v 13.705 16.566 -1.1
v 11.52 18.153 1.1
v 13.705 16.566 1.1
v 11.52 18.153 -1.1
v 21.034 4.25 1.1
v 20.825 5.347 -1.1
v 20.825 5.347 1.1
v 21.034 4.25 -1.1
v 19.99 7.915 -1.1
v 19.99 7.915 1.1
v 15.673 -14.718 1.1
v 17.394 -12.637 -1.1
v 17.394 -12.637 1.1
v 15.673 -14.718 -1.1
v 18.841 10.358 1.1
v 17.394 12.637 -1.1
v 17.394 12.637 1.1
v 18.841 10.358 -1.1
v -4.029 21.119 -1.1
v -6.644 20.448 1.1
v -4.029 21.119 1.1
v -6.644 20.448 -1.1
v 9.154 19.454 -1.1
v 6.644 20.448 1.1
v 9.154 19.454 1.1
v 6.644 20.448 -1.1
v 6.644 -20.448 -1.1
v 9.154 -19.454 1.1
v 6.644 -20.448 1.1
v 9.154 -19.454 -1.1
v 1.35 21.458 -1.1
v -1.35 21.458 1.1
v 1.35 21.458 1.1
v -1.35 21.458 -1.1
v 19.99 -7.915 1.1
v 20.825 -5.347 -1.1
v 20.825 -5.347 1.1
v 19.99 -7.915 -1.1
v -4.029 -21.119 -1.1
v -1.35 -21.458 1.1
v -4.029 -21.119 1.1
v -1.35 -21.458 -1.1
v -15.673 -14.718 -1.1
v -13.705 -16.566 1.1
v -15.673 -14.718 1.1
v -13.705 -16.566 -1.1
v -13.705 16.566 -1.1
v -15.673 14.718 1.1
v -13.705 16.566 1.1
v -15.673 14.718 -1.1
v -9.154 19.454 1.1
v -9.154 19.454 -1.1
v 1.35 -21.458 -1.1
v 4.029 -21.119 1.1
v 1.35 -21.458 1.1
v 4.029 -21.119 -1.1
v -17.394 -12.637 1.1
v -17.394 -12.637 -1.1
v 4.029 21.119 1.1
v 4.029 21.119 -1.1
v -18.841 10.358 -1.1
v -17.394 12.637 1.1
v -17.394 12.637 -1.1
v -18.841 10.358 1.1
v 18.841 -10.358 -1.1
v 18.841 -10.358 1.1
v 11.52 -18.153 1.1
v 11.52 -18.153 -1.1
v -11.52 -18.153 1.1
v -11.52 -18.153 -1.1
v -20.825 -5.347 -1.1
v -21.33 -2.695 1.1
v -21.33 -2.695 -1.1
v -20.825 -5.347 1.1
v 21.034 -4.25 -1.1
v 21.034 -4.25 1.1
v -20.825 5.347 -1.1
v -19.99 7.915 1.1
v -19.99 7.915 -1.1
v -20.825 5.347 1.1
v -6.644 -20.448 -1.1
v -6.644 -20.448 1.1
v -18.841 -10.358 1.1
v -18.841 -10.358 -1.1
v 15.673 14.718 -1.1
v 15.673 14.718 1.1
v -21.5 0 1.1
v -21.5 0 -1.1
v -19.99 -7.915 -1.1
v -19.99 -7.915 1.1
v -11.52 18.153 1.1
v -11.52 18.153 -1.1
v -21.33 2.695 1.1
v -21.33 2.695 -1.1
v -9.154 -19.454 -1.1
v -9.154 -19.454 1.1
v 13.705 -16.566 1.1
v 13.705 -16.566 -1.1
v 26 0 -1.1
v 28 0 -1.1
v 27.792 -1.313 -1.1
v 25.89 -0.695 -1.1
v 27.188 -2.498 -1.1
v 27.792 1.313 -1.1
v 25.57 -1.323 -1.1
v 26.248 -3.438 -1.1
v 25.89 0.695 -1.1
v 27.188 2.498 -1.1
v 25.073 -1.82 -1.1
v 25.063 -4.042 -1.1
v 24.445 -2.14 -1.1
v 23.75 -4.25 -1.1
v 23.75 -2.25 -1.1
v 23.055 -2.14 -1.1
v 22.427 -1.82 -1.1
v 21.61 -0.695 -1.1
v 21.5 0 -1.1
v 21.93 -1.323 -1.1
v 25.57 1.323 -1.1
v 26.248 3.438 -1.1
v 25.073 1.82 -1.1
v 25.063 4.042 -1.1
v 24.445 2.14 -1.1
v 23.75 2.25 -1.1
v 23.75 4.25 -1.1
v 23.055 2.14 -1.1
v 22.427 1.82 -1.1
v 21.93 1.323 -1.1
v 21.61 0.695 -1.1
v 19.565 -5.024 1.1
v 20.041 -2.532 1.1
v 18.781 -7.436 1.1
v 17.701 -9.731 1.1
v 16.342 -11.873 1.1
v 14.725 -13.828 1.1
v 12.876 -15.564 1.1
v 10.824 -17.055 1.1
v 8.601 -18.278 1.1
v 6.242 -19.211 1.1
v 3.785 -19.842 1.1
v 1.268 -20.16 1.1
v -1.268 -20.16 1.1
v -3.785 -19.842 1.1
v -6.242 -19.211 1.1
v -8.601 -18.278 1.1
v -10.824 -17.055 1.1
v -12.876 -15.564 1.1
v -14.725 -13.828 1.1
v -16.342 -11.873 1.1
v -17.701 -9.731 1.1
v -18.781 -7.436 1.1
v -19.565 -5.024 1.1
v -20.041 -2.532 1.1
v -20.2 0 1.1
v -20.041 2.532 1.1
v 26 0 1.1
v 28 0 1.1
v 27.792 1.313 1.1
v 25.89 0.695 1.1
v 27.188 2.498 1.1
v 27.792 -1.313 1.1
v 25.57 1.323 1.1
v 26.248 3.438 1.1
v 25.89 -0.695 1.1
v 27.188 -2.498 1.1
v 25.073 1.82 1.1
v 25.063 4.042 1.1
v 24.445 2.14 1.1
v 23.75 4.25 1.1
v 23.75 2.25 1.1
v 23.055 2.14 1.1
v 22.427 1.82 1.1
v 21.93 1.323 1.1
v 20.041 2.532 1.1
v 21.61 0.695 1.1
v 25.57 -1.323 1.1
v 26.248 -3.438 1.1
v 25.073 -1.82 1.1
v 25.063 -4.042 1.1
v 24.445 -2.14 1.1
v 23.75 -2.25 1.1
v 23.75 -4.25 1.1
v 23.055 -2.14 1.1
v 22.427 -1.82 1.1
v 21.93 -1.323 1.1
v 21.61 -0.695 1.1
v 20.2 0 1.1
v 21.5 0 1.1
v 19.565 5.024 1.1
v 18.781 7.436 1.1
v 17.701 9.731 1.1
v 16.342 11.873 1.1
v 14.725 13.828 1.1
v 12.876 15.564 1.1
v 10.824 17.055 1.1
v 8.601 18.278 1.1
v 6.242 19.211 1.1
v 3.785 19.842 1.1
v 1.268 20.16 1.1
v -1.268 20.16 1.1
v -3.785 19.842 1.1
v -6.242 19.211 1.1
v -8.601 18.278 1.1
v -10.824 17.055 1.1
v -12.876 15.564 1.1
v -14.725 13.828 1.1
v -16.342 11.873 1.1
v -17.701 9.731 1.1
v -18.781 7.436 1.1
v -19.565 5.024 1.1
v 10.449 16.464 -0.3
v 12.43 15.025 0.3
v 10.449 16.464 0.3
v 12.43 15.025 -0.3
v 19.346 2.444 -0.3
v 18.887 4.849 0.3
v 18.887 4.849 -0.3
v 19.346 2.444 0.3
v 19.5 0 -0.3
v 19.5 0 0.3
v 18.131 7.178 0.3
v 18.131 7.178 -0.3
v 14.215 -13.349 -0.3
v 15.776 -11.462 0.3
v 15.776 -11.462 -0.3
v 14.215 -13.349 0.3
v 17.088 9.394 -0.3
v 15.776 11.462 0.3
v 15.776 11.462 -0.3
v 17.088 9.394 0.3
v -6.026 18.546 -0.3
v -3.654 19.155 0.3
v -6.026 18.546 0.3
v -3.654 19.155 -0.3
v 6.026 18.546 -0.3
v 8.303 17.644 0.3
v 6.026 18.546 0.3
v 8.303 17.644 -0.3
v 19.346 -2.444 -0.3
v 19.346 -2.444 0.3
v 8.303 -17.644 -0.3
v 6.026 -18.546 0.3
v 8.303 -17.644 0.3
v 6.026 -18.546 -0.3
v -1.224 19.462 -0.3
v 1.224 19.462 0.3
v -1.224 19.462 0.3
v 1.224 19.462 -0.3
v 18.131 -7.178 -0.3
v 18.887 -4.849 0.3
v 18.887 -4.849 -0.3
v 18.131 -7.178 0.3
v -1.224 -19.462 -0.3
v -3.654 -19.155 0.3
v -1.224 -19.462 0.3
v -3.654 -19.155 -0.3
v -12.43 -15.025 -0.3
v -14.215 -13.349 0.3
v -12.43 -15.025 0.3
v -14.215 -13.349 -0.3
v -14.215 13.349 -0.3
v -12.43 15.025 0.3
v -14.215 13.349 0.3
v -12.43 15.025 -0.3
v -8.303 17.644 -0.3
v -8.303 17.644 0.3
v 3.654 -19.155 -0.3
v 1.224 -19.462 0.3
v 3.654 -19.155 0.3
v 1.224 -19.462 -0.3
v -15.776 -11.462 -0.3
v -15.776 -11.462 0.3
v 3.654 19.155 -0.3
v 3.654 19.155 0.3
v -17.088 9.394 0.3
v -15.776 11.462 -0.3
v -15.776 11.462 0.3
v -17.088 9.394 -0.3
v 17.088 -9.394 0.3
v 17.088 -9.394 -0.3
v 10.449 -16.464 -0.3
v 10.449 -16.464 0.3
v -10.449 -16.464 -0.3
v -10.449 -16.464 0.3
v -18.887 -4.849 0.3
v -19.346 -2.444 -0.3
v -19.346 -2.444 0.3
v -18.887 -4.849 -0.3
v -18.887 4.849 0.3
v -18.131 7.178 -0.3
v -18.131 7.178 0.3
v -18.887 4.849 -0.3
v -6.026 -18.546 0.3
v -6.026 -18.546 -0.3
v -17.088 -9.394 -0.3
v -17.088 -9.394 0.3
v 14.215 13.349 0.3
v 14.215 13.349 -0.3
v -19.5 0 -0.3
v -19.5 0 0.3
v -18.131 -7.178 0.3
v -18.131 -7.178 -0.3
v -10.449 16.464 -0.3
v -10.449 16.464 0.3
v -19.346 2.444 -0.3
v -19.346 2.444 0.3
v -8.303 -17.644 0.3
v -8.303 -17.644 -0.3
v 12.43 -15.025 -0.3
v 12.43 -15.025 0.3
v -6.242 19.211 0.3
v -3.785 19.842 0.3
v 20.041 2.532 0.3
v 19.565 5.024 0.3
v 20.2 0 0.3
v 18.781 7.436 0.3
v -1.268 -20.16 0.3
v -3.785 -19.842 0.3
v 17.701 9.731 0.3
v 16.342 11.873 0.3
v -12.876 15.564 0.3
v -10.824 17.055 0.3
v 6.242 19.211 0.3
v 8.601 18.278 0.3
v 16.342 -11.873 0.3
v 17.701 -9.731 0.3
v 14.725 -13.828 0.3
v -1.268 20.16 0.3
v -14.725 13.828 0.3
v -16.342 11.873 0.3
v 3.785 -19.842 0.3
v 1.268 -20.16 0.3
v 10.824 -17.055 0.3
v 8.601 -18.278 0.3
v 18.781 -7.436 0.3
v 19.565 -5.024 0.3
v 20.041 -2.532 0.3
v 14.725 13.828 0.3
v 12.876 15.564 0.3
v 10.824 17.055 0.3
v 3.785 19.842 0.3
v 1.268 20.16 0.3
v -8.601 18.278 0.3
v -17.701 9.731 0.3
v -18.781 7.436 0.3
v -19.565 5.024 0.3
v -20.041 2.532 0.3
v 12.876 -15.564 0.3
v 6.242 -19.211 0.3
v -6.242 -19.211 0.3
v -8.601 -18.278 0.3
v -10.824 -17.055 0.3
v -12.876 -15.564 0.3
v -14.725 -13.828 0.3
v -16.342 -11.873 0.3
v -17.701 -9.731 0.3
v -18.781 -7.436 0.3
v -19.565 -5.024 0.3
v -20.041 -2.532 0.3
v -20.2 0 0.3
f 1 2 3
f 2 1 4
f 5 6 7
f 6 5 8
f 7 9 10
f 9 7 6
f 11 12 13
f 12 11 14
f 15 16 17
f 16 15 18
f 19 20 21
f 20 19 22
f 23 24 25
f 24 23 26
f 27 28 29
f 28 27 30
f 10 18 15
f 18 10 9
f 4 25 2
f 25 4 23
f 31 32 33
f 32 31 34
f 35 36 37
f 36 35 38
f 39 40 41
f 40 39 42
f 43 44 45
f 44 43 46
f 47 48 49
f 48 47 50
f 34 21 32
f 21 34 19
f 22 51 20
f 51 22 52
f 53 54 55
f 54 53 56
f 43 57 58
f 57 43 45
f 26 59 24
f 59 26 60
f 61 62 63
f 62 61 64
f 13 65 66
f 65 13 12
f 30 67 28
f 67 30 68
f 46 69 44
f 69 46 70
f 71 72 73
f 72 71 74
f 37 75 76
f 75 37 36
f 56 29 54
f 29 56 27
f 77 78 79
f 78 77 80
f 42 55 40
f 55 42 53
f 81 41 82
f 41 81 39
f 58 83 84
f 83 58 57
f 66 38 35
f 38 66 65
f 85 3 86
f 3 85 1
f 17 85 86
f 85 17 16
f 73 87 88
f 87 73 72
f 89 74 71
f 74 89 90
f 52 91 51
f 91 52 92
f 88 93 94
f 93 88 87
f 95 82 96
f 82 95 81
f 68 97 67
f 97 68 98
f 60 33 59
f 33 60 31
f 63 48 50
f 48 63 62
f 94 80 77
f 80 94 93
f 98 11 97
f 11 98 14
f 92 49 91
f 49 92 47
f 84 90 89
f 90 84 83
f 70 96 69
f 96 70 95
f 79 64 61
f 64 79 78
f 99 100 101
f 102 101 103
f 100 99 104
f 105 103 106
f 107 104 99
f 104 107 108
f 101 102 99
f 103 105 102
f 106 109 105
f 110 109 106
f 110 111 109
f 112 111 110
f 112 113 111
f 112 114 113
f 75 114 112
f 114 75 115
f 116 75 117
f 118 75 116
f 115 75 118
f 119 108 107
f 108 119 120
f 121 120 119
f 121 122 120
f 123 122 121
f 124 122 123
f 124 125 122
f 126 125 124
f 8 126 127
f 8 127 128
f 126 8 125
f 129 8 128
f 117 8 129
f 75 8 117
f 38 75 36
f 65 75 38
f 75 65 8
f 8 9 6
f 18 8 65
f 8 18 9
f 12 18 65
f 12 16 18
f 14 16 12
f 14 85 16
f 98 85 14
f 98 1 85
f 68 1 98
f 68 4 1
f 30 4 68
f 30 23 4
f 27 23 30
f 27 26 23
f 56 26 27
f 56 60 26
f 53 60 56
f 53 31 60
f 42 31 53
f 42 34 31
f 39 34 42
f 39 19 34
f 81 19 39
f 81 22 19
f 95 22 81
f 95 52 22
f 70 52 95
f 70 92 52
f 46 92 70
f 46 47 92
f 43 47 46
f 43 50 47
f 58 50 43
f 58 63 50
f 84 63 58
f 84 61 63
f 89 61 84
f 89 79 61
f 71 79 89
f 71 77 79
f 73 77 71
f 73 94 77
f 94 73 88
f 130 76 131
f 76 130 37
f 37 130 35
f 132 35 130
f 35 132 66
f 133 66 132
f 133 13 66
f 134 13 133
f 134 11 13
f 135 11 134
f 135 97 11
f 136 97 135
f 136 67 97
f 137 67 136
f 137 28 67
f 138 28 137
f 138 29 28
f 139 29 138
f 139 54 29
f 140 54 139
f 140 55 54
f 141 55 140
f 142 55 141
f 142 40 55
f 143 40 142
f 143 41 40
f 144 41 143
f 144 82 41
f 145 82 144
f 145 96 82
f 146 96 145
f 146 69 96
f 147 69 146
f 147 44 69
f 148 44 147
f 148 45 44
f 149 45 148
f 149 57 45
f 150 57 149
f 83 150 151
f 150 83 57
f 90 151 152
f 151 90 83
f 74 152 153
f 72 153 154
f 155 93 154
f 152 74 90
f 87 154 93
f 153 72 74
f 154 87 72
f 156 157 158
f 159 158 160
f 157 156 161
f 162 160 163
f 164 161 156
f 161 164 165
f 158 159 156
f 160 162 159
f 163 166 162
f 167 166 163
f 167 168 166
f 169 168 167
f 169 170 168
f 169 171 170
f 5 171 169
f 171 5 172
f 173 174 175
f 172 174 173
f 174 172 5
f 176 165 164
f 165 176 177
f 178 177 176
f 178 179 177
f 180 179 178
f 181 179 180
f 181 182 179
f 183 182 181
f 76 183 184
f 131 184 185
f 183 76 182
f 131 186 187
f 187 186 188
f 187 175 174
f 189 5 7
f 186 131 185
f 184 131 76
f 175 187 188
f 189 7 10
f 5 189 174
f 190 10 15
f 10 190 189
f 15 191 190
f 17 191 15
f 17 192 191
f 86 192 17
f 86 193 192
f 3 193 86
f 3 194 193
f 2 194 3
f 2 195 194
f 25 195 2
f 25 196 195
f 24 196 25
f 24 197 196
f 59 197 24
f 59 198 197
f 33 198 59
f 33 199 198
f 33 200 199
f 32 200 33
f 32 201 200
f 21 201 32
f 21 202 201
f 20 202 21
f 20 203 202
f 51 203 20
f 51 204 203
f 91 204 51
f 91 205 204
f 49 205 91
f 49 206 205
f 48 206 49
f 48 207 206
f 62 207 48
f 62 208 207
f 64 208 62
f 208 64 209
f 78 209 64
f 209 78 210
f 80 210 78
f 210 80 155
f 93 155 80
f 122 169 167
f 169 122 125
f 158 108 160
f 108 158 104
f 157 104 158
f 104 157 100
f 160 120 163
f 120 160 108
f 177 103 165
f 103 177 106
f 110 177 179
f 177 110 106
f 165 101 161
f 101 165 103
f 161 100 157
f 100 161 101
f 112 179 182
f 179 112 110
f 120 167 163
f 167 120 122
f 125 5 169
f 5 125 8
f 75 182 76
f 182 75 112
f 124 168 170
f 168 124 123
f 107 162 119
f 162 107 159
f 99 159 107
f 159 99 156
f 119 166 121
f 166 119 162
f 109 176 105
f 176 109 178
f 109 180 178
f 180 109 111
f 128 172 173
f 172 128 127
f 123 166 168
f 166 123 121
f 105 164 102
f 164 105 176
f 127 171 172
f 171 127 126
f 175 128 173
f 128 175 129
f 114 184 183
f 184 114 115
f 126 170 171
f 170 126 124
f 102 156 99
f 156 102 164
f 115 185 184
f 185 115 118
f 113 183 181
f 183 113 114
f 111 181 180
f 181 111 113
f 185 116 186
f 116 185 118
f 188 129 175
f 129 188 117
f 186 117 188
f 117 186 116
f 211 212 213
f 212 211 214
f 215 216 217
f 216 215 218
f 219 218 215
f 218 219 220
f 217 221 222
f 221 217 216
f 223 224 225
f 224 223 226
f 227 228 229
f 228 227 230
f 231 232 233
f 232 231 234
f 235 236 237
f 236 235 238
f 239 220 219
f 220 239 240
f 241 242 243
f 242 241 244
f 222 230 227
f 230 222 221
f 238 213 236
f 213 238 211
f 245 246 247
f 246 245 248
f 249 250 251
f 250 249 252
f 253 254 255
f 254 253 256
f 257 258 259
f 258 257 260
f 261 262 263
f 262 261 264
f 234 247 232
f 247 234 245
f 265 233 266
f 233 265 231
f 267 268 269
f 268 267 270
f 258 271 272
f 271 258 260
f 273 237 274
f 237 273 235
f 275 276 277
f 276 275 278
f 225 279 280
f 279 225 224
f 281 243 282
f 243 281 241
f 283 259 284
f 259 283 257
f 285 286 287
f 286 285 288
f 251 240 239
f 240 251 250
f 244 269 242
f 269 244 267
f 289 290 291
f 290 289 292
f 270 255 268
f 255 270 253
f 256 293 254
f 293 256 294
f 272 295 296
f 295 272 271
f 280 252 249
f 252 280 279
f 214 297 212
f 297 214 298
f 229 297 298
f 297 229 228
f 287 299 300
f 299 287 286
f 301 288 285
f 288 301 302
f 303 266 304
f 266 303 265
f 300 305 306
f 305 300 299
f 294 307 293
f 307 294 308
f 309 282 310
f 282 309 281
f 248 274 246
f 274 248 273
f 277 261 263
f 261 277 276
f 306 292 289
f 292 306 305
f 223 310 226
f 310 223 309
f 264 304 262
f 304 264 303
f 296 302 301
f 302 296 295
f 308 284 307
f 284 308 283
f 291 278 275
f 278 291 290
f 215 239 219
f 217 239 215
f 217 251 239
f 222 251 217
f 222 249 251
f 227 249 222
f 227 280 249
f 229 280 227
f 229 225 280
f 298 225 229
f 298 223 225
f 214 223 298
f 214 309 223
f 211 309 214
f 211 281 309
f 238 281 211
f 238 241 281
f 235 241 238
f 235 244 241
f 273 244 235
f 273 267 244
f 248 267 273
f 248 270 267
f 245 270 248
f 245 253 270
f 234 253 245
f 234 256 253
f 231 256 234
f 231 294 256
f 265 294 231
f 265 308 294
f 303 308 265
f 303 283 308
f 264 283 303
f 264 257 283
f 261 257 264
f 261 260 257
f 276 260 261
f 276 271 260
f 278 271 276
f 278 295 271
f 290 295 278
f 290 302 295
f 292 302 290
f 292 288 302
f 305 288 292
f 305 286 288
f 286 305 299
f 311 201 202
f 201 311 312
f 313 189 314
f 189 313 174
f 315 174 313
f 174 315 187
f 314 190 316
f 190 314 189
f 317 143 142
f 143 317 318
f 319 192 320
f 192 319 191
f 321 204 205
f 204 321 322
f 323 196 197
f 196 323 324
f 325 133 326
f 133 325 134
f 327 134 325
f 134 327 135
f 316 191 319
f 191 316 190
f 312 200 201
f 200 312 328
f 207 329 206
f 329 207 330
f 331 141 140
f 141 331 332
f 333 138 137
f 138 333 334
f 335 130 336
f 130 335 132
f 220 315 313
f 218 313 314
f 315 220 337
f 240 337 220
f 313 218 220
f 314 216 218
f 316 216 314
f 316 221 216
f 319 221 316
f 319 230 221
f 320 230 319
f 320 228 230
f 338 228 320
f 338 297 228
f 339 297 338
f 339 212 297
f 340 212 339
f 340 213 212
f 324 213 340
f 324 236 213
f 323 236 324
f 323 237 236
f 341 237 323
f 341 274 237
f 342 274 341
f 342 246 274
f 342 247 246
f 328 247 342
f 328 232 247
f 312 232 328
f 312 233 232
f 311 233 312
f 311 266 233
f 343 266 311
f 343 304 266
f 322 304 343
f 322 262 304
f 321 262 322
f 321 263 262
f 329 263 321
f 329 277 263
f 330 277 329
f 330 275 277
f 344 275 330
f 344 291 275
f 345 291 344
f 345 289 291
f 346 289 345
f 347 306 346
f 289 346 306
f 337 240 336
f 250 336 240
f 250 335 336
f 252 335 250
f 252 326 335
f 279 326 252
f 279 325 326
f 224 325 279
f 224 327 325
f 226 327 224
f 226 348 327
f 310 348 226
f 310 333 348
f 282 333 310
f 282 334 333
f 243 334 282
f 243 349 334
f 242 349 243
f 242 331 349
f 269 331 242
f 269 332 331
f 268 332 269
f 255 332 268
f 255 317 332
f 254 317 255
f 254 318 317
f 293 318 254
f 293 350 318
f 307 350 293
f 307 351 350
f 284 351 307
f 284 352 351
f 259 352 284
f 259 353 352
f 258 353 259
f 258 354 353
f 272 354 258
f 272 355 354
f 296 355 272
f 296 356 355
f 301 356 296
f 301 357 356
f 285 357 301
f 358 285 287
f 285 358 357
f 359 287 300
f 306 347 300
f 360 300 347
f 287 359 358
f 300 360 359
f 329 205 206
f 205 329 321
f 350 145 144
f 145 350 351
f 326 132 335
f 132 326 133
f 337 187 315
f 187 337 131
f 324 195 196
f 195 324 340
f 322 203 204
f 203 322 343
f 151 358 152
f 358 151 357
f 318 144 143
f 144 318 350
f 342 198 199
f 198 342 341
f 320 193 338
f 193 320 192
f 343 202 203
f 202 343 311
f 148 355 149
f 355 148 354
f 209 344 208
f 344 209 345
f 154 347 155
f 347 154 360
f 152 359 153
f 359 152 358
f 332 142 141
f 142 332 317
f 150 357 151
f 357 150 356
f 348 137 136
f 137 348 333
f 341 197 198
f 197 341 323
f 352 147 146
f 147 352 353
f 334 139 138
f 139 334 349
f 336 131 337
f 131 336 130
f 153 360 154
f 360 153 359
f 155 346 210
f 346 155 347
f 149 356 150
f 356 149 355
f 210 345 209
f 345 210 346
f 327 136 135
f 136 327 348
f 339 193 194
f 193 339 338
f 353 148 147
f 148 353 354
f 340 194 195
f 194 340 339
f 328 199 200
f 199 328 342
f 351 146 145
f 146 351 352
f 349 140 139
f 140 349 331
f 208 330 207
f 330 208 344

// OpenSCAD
// Pasutx, 7.4.2013
// NFC keyfob
//
// Change these parameters:

CavityDiameter=39;
Part=0; // [0:Case, 1:Lid]
Shape=0;  // [0:Circle, 1:Square]

LidThickness=0.8;
CavityThickness=0.6;
BottomThickness=0.8;

SideWidth=2;
LidSupportWidth=0.7;

RingOutsideDiameter=8.5;
RingHoleDiameter=4.5;

Tolerance=0.15;

//Only relevant for square fobs
RoundingRadius=3; 

// Do NOT change these parameters:
OutsideRadius=CavityDiameter/2+SideWidth;
CavityRadius=CavityDiameter/2;
RingHoleRadius=RingHoleDiameter/2;
RingOutsideRadius=RingOutsideDiameter/2;
TotalThickness=LidThickness+CavityThickness+BottomThickness;
RingThickness=RingOutsideRadius-RingHoleRadius;


// Create a cube([X,Y,Z]) with rounded vertical edges (radius R)
module RoundedBox (X,Y,Z,R)
{
	intersection()
   {
	   minkowski()
		{
		 cube([X-2*R,Y-2*R,Z],center=true);
		 cylinder(r=R,h=Z,$fn=16,center=true);
		}
		cube([2*X,2*Y,Z],center=true);
	}
}

if (Shape==0)
{
	if (Part==0)
	{
		//Show Case
		difference()
		{
			union()
			{
				//main body
				cylinder(r=OutsideRadius,h=TotalThickness,center=true,$fn=50);
				//ring
				translate([OutsideRadius+RingOutsideRadius-SideWidth,0,0])
					cylinder(r=RingOutsideRadius,h=TotalThickness,center=true,$fn=20);
				//ring connection
				translate([OutsideRadius-SideWidth,0,0])
					cube(size=[2*RingOutsideRadius,2*RingOutsideRadius,TotalThickness],center=true);
			}
			//ring hole
			translate([OutsideRadius+RingOutsideRadius-SideWidth,0,0])
				cylinder(r=RingHoleRadius,h=2*TotalThickness,center=true,$fn=20);
			//nfc cavity
			translate([0,0,BottomThickness])
				cylinder(r=CavityRadius,h=TotalThickness,center=true,$fn=50);
			//lid cavity
			translate([0,0,BottomThickness+CavityThickness])
				cylinder(r=CavityRadius+LidSupportWidth,h=TotalThickness,center=true,$fn=50);
		}
	}
	else
	{
		//Show Lid
		cylinder(r=CavityRadius+LidSupportWidth-Tolerance, h=LidThickness);
	}
}
else
{
	if (Part==0)
	{
		//Show Case
		difference()
		{
			union()
			{
				//main body
				RoundedBox (2*OutsideRadius,2*OutsideRadius,TotalThickness,RoundingRadius);
				//ring
				translate([OutsideRadius+RingOutsideRadius-SideWidth,0,0])
					cylinder(r=RingOutsideRadius,h=TotalThickness,center=true,$fn=20);
				//ring connection
				translate([OutsideRadius-SideWidth,0,0])
					cube(size=[2*RingOutsideRadius,2*RingOutsideRadius,TotalThickness],center=true);
			}
			//ring hole
			translate([OutsideRadius+RingOutsideRadius-SideWidth,0,0])
				cylinder(r=RingHoleRadius,h=2*TotalThickness,center=true,$fn=20);
			//nfc cavity
			translate([0,0,BottomThickness])
				RoundedBox(2*CavityRadius,2*CavityRadius,TotalThickness,RoundingRadius);
			//lid cavity
			translate([0,0,BottomThickness+CavityThickness])
				RoundedBox(2*(CavityRadius+LidSupportWidth),2*(CavityRadius+LidSupportWidth),TotalThickness,RoundingRadius);
		}
	}
	else
	{
		//Show Lid
		RoundedBox(2*(CavityRadius+LidSupportWidth-Tolerance),2*(CavityRadius+LidSupportWidth-Tolerance),LidThickness,RoundingRadius);
	}
}


